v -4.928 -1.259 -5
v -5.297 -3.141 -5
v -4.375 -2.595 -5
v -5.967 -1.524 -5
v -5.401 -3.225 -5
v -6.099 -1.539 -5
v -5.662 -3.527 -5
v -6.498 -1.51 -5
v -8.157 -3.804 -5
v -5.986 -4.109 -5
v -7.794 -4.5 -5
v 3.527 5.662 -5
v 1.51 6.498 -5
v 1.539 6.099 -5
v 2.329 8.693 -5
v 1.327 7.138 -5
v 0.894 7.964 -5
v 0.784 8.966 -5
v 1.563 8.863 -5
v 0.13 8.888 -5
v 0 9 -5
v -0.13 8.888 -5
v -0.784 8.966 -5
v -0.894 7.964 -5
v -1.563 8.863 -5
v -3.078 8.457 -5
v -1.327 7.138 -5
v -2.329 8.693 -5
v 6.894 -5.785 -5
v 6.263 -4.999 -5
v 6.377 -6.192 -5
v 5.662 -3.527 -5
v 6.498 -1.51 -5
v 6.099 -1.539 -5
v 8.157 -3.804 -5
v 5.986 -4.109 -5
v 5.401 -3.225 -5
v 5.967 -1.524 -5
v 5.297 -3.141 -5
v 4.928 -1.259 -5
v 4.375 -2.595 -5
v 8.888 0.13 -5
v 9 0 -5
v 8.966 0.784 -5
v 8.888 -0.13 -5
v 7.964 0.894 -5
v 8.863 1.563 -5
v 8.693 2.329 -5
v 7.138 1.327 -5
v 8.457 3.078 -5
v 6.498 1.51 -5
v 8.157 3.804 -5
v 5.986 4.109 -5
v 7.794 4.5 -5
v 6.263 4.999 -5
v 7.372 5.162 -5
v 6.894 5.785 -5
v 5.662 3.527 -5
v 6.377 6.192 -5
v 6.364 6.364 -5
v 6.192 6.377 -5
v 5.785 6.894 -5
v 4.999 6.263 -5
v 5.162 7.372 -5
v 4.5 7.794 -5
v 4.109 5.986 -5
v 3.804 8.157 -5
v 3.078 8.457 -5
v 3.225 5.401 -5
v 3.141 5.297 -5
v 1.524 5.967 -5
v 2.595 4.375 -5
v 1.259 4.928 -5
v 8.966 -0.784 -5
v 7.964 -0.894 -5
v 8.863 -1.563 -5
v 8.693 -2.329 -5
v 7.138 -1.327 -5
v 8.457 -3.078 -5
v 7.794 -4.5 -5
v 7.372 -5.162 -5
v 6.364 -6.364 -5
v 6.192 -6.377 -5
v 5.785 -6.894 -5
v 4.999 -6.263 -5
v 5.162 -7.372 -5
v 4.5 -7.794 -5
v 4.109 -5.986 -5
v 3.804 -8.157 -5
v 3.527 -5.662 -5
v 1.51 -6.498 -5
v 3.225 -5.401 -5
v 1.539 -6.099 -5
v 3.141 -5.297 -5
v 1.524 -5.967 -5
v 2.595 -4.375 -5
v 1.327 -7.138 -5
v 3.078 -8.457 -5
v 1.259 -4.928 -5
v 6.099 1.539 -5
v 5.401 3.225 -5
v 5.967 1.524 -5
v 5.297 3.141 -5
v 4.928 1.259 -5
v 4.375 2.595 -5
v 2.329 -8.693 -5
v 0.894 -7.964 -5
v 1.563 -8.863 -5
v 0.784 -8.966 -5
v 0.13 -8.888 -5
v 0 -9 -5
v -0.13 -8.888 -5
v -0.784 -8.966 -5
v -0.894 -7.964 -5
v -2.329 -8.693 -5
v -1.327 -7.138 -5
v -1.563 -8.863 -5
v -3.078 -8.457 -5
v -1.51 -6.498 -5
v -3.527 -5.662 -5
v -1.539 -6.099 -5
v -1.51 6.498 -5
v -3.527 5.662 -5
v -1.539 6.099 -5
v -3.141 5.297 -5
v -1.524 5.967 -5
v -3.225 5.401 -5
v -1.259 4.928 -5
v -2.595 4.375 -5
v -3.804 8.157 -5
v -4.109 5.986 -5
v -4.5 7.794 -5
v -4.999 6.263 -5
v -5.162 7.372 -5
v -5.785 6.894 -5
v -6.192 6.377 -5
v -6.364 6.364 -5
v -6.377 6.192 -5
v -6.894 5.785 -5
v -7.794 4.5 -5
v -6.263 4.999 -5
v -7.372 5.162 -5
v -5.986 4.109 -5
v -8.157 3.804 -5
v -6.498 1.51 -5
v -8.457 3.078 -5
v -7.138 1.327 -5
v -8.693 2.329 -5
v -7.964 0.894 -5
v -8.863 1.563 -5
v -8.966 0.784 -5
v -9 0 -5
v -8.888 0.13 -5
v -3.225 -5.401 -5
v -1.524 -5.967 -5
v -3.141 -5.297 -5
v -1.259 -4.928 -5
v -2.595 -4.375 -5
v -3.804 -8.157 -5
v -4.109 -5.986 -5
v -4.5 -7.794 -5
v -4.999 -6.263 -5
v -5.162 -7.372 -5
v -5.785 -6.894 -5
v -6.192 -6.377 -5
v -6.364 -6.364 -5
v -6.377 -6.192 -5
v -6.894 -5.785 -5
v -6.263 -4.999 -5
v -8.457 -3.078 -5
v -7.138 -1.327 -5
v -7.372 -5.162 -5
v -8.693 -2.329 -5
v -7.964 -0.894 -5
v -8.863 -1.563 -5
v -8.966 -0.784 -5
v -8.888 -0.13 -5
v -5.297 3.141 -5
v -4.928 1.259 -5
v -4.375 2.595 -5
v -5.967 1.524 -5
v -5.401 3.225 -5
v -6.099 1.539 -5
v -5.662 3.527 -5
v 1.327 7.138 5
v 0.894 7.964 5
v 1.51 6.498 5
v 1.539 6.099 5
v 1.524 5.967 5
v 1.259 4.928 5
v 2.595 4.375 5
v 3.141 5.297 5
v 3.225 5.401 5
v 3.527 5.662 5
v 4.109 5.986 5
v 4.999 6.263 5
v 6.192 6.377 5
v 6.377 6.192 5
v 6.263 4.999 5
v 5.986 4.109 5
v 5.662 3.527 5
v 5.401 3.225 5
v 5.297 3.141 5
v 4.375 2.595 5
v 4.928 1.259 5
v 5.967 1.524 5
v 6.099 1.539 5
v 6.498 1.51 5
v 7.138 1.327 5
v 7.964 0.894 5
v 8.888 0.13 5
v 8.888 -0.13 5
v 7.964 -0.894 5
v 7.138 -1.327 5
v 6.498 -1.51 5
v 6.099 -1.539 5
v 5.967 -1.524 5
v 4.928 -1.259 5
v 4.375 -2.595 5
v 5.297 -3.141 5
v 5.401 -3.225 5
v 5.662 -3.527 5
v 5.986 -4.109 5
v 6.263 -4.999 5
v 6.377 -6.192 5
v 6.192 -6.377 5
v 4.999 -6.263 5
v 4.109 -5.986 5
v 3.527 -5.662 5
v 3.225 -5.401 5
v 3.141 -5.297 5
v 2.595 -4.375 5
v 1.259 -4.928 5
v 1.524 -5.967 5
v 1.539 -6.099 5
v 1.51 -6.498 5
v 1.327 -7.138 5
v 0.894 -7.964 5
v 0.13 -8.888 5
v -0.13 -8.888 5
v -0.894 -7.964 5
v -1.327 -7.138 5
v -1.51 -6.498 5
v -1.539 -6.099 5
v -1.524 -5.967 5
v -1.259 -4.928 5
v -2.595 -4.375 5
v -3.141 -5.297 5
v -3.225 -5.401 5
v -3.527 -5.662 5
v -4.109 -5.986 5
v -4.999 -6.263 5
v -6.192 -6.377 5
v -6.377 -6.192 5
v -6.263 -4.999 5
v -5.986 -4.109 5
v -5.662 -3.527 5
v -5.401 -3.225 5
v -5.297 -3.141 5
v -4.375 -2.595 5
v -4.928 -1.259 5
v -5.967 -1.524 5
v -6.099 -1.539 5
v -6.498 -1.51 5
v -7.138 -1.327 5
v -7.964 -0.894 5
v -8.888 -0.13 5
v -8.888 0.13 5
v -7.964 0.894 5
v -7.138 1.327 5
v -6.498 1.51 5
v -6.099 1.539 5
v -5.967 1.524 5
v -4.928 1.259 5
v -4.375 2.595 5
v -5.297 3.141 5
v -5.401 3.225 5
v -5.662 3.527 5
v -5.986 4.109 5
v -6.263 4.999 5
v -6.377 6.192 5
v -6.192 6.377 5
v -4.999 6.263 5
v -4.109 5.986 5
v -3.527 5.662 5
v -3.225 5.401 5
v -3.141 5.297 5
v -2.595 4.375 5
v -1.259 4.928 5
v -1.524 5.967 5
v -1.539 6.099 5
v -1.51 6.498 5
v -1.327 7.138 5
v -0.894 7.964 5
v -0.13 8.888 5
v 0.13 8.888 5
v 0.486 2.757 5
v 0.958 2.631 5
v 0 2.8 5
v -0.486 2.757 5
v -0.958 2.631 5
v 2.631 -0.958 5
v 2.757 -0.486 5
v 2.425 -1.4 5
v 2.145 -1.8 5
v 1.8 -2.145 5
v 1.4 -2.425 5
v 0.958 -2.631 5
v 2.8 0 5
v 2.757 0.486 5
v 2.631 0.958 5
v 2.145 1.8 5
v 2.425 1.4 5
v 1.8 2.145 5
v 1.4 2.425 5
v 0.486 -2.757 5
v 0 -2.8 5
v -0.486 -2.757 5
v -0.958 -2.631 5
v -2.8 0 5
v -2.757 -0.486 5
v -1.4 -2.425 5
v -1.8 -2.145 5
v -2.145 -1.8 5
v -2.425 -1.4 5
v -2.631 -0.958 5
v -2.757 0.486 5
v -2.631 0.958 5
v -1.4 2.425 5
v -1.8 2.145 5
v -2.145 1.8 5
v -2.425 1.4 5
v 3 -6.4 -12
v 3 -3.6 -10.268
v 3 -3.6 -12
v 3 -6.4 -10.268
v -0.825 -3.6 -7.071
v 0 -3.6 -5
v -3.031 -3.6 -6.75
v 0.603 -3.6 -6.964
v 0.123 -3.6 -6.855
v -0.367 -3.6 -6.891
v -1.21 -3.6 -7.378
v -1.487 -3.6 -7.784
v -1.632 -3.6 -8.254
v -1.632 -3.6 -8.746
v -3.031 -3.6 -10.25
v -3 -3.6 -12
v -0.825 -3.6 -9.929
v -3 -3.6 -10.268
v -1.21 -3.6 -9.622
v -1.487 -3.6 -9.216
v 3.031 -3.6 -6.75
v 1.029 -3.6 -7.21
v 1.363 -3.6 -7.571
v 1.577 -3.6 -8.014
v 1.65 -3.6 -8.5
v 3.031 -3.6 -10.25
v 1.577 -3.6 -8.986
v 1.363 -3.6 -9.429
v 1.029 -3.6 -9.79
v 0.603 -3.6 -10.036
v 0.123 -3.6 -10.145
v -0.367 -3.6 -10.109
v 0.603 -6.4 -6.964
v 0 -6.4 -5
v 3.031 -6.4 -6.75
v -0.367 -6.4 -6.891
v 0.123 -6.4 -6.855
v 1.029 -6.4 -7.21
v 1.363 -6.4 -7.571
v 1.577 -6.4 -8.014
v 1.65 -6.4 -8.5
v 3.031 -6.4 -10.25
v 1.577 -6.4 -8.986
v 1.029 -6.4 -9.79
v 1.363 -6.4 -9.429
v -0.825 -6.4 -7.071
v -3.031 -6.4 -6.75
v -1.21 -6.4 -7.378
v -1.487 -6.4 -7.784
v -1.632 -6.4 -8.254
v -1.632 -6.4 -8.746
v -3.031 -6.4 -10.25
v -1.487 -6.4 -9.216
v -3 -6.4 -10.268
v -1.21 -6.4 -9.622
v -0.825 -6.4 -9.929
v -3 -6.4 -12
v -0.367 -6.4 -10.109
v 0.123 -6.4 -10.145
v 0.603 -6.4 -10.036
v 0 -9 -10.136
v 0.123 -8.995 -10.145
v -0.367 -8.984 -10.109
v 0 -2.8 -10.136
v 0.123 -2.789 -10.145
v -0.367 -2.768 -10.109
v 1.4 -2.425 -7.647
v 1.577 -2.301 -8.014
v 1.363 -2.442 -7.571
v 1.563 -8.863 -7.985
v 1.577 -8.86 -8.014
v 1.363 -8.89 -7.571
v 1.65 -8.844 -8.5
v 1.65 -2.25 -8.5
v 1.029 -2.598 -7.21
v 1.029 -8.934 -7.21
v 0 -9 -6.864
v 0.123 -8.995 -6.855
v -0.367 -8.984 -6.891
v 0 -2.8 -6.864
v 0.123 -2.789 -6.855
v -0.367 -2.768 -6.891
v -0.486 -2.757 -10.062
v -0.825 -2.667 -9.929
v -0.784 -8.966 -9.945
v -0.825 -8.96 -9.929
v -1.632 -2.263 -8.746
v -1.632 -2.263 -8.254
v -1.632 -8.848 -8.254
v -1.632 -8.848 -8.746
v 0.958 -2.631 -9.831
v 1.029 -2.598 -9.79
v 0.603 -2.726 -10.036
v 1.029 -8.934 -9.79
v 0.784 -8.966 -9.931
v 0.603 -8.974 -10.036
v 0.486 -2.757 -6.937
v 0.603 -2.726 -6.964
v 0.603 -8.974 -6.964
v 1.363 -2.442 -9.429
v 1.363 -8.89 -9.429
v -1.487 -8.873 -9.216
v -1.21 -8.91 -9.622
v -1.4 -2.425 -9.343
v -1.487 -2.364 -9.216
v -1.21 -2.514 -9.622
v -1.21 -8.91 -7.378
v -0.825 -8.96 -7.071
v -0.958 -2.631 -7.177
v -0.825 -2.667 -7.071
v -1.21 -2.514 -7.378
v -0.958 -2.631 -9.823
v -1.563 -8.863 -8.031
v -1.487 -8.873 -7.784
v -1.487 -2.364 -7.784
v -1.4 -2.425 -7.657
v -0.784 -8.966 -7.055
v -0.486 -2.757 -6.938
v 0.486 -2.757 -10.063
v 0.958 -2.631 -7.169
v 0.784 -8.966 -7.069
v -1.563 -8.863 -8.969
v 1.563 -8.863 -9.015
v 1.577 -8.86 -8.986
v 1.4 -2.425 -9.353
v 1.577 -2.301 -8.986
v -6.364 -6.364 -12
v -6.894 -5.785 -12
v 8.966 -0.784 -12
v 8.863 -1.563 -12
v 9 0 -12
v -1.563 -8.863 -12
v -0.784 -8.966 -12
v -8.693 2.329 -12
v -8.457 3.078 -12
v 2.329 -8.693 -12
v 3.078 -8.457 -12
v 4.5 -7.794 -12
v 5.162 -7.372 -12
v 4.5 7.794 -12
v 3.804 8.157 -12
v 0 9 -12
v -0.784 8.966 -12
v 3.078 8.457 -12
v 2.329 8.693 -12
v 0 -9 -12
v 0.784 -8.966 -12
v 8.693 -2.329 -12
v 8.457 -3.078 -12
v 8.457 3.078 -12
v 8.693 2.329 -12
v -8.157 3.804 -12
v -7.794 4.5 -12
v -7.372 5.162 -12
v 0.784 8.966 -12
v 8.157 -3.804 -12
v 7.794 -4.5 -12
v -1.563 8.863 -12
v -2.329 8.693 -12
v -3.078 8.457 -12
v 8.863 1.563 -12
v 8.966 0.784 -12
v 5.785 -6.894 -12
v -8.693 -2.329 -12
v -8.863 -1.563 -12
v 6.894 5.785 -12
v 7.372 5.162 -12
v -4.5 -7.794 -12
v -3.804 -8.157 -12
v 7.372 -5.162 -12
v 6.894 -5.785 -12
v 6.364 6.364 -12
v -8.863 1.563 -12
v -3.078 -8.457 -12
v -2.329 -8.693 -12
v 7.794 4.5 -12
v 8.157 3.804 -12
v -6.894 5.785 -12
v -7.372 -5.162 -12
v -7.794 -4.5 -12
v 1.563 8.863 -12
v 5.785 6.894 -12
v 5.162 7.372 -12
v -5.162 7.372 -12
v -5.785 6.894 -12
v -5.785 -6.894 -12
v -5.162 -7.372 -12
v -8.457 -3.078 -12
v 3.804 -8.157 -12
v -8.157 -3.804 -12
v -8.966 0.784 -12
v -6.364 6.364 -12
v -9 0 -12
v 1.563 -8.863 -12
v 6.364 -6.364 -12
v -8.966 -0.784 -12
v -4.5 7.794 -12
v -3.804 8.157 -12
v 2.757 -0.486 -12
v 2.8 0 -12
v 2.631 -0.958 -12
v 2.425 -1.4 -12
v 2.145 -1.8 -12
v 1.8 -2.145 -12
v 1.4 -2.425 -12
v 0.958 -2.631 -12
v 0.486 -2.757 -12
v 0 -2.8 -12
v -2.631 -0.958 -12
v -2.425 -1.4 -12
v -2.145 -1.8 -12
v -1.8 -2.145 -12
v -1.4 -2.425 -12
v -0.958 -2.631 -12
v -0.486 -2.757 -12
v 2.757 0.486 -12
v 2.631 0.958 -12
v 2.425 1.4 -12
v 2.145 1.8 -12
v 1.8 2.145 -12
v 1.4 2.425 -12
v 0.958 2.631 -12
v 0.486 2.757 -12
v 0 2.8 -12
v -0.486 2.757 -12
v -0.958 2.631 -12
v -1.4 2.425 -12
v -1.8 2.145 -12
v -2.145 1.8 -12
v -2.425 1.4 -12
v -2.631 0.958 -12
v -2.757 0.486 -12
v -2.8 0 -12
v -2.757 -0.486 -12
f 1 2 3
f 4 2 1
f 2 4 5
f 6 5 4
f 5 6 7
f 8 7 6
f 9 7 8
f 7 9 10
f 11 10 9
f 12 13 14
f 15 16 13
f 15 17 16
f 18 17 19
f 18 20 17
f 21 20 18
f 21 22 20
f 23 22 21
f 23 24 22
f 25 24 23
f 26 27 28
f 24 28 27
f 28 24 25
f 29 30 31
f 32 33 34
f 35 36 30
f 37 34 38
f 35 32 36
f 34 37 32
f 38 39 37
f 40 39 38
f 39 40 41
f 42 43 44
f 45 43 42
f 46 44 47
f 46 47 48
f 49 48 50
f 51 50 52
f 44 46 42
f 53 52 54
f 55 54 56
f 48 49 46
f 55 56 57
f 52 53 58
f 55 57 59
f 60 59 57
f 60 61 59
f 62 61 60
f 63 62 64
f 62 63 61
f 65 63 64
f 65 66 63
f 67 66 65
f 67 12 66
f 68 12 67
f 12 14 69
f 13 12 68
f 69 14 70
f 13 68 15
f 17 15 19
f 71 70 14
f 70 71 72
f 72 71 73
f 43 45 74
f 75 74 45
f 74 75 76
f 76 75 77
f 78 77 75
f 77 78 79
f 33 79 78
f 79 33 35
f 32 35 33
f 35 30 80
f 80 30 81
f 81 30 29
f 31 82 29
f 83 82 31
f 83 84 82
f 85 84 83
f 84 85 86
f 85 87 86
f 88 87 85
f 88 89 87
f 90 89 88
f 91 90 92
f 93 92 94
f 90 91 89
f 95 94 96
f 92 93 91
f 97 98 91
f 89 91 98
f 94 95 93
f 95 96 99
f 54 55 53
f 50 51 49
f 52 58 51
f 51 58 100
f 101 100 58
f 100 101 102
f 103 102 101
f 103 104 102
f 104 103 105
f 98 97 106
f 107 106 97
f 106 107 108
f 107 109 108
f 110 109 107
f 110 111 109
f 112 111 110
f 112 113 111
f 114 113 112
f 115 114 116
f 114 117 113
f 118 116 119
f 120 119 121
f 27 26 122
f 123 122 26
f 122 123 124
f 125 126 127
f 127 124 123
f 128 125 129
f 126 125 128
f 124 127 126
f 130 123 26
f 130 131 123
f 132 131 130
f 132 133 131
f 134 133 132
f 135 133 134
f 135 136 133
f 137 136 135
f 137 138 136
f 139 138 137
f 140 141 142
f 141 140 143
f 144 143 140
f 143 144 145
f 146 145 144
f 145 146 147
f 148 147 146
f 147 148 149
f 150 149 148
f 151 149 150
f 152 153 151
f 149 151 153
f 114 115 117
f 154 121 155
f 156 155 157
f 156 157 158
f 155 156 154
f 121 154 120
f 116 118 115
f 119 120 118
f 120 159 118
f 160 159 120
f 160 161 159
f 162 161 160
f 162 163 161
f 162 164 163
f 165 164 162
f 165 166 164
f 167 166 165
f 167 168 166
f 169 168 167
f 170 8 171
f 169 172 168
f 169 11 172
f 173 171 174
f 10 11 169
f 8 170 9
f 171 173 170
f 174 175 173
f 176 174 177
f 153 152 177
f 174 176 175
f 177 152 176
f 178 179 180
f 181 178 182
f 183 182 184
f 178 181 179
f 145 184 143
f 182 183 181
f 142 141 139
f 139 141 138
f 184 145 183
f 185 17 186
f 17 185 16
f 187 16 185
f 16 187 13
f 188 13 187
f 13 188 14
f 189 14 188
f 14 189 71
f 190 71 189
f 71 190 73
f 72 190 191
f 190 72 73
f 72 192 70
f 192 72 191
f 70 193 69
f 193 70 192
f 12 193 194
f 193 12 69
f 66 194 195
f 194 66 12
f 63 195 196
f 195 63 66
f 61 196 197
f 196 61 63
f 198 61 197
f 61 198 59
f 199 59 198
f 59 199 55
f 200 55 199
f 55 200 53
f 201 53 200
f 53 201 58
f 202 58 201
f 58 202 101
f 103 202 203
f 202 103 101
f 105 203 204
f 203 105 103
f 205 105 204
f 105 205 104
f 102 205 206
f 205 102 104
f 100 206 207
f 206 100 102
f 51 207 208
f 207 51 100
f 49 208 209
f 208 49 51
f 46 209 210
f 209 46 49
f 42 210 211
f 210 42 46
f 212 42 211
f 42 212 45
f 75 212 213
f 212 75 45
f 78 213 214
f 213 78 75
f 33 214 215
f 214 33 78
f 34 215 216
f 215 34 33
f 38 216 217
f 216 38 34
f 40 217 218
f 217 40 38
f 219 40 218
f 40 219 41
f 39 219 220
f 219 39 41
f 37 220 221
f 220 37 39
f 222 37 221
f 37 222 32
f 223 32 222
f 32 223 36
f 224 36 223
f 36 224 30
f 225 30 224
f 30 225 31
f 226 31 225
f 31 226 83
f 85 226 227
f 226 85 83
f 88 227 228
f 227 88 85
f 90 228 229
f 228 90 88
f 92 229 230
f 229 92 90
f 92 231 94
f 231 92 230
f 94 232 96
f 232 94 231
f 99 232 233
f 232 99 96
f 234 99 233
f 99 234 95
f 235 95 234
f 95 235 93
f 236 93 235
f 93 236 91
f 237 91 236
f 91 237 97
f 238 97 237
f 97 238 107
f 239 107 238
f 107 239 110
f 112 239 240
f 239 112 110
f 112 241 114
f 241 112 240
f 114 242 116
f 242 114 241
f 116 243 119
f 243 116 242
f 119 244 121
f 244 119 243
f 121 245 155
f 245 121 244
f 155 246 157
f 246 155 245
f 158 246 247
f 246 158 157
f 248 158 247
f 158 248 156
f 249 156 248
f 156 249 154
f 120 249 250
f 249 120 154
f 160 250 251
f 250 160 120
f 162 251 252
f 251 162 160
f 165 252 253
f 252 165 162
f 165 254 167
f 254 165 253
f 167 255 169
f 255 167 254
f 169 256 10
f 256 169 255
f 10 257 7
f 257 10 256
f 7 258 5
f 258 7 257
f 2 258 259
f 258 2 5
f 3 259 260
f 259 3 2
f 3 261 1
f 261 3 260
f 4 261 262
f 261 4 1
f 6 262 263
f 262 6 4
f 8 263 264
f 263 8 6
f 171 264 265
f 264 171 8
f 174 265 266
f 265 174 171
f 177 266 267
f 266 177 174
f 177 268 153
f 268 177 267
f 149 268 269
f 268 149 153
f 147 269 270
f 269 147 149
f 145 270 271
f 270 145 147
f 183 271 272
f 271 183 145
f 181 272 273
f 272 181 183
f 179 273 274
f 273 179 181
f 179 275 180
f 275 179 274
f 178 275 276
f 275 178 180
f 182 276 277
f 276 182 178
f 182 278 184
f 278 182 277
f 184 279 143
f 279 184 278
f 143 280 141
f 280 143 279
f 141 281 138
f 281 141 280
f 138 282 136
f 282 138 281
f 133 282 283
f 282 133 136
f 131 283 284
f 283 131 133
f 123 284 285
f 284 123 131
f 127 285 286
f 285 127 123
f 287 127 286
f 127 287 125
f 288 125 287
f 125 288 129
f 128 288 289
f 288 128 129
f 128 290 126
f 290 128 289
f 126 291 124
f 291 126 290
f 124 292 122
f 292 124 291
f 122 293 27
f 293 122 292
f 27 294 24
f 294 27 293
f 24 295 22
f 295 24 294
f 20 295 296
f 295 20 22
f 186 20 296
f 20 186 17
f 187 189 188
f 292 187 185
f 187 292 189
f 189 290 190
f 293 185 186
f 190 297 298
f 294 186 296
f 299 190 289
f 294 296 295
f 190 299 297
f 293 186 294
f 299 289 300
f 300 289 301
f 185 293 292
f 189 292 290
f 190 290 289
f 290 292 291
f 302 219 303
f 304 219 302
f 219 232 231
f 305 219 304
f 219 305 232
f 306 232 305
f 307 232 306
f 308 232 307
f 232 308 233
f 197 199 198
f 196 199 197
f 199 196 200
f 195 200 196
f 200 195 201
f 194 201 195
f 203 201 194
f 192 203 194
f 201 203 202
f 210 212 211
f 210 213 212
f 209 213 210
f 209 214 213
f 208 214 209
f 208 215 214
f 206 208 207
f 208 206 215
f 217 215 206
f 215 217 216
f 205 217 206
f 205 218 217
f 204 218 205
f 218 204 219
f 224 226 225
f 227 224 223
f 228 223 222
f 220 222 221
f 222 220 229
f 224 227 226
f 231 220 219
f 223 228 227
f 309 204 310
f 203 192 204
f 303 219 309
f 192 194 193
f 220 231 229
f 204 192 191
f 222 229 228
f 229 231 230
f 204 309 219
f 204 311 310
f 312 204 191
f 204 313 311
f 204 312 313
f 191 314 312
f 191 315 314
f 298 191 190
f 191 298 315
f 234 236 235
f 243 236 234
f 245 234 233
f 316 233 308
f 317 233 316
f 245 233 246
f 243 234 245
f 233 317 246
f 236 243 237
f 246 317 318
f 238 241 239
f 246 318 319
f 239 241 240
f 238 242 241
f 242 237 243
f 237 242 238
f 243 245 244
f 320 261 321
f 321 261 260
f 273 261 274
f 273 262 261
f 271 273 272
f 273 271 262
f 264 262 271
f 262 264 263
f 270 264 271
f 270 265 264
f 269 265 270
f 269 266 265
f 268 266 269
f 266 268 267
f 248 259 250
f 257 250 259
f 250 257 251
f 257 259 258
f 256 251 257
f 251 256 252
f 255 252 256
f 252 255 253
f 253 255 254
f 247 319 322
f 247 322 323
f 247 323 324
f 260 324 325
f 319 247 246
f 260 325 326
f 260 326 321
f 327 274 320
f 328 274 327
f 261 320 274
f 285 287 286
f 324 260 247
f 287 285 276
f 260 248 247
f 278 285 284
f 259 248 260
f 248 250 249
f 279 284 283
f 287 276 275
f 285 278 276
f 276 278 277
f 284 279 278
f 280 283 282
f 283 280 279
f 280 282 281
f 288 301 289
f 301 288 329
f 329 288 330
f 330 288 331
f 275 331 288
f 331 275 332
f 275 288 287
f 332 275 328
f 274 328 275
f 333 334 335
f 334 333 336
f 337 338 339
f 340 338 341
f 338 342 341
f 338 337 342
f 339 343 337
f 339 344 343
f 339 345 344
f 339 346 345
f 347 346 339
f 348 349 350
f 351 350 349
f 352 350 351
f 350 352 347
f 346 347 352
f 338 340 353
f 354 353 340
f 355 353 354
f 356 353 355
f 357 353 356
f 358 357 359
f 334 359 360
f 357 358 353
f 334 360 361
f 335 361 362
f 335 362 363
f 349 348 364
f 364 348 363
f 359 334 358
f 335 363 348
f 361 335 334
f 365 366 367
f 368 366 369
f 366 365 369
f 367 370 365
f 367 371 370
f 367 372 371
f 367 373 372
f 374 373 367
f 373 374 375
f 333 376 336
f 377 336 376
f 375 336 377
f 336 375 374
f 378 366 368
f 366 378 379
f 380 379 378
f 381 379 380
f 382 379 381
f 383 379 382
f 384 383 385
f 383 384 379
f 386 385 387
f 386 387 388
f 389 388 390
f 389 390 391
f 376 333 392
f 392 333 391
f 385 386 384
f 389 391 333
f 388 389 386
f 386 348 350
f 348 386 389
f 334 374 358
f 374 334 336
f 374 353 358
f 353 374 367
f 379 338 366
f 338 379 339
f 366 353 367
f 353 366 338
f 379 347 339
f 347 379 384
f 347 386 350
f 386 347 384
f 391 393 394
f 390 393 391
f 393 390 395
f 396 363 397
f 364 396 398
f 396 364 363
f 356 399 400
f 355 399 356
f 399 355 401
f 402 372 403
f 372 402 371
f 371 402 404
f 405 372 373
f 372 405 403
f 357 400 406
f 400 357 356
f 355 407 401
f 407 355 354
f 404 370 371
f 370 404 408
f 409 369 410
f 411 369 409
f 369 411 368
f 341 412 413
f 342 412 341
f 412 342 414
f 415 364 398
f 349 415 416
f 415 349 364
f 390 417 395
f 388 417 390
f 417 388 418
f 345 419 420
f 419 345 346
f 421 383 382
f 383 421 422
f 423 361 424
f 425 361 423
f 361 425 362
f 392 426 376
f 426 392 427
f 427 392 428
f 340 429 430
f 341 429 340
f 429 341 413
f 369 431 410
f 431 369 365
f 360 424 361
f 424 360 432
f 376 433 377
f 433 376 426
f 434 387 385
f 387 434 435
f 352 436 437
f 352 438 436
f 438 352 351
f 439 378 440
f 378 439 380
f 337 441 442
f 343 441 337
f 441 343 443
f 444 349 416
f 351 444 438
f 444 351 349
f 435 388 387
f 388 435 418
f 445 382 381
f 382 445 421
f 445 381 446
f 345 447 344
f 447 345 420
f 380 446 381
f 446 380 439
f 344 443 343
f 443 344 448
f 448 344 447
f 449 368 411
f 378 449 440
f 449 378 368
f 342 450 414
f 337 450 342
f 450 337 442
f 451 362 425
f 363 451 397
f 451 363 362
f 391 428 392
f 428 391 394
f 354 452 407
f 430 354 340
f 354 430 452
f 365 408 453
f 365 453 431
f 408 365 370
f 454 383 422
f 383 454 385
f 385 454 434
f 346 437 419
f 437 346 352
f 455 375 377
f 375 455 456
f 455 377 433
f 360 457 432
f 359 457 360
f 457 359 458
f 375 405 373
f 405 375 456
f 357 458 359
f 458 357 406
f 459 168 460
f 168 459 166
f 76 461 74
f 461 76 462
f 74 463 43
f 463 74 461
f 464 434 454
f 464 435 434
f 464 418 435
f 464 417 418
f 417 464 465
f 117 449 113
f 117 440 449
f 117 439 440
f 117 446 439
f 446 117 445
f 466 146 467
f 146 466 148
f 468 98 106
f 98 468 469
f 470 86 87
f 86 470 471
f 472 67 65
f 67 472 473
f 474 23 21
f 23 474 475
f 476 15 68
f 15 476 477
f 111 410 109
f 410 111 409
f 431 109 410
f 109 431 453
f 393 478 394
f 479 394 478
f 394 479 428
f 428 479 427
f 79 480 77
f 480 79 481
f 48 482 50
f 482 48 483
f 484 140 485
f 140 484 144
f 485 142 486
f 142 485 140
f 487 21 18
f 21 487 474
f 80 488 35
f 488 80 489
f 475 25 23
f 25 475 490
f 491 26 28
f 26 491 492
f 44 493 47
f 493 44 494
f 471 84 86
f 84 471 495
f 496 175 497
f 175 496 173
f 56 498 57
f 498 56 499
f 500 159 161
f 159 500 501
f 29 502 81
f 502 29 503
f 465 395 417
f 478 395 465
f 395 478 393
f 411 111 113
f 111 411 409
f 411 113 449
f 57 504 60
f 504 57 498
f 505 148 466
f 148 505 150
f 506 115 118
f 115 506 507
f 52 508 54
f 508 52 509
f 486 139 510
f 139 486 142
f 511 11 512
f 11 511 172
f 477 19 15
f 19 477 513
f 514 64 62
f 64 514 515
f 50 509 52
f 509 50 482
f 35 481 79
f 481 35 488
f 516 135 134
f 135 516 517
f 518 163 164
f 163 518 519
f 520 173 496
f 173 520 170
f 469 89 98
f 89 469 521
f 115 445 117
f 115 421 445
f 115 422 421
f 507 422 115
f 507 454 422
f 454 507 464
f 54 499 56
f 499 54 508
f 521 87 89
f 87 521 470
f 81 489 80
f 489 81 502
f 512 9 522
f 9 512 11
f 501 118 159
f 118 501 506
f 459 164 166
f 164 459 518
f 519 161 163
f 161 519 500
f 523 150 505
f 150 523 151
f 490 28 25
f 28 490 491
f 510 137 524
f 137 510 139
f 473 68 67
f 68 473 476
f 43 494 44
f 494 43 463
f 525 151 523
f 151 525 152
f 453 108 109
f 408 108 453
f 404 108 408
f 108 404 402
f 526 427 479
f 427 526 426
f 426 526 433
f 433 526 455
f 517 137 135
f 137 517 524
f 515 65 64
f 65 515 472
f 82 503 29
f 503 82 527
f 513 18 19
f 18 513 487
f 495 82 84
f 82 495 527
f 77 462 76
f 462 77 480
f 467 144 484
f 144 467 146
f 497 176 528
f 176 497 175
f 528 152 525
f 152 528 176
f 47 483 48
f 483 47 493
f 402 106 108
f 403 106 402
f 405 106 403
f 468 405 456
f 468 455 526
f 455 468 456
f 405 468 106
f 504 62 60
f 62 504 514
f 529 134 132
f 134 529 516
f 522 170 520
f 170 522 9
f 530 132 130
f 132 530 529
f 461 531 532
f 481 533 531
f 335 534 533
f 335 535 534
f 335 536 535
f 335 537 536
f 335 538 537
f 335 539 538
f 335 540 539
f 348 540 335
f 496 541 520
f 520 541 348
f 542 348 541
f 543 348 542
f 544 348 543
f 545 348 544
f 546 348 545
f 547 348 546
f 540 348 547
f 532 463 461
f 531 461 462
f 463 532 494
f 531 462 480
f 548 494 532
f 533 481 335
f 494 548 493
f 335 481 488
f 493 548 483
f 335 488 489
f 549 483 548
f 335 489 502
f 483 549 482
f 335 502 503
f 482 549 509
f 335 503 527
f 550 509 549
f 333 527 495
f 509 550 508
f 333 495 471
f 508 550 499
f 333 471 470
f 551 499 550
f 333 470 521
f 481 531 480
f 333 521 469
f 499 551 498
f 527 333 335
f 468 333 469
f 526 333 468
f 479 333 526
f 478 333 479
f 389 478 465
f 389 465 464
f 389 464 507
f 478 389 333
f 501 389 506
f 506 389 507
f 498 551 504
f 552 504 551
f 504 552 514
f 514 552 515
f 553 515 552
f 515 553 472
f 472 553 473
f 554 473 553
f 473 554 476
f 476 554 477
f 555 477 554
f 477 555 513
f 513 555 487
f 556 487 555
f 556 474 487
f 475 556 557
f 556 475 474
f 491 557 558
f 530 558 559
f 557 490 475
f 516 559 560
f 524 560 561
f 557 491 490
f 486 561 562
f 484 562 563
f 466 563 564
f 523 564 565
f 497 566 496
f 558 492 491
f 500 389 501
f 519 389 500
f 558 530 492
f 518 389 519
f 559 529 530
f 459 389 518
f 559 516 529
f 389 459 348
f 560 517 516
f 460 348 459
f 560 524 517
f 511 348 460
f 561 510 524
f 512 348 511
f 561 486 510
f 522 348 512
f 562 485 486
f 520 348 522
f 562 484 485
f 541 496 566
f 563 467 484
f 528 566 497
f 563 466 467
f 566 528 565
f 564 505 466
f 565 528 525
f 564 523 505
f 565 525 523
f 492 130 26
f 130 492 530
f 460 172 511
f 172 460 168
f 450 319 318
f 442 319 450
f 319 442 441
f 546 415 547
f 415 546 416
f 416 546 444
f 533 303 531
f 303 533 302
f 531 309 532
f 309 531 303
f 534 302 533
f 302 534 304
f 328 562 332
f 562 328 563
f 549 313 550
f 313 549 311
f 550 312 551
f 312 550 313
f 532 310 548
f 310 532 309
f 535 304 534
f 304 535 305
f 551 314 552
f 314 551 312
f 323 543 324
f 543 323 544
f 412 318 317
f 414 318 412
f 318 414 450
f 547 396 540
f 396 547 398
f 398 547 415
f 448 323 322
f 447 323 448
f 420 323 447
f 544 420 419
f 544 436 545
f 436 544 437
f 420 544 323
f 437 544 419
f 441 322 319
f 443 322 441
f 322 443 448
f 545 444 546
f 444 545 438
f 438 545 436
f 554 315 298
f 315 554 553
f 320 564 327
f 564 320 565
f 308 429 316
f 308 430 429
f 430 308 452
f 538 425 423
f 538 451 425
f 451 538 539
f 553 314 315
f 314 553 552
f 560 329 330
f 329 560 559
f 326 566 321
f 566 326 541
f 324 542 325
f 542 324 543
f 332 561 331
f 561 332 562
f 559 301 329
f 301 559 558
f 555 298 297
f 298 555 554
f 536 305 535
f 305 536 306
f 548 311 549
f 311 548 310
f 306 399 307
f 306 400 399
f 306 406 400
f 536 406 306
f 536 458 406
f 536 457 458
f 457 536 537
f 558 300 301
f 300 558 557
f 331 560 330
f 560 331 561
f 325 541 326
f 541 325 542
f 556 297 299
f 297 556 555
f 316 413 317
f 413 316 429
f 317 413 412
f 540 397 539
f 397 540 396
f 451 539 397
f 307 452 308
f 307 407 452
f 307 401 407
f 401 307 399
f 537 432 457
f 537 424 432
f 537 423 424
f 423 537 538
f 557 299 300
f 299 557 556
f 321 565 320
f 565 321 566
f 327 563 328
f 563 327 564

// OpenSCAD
/* Derived by Carlosgs from:
 * http://www.thingiverse.com/thing:12789
 * An extruder gear set for the TechZone Huxley,
 *	featuring Herringbone teeth.
 * You will have to recalibrate your E_STEPS_PER_MM in
 *	your firmware (ratio changing from original techzone
 *	lasercut gears).
 * This use 2 modules from the MCAD library that you can
 *	get from https://github.com/elmom/MCAD.
 * 
 * Part - the motor gear mount hub with set screw hole -
 *	derived from http://www.thingiverse.com/thing:3104
 *	(thanks GilesBathgate) which is under GPL CC license.
 *
 * August 2013 added 2 extra setscrews to ensure centered usage.
 * by Harry Binnema. 
 *
* Copyright (C) 2011	Guy 'DeuxVis' P.
 *
 * This program is free software; you can redistribute it and/or
 * modify it under the terms of the GNU General Public License
 * as published by the Free Software Foundation; either version 2
 * of the License, or (at your option) any later version.
 * 
 * This program is distributed in the hope that it will be useful,
 * but WITHOUT ANY WARRANTY; without even the implied warranty of
 * MERCHANTABILITY or FITNESS FOR A PARTICULAR PURPOSE.	See the
 * GNU General Public License for more details.

 * You should have received a copy of the GNU General Public License
 * along with this program; if not, write to the Free Software
 * Foundation, Inc., 51 Franklin Street, Fifth Floor, Boston, MA	02110-1301, USA.
 * -- 
 *		 DeuxVis - device@ymail.com */

include <MCAD/materials.scad>
include <MCAD/teardrop.scad>
include <MCAD/involute_gears.scad>

motor_shaft_diameter=5.6;
pos=15.4-1; //position hole for grubnut
nholes = 7;
shaft_diam=9;
shaft_height=7;

// Increase the resolution of default shapes
$fa = 5; // Minimum angle for fragments [degrees]
$fs = 0.5; // Minimum fragment size [mm]

/* Herringbone gear module, adapted from MCAD/involute_gears */
module herringbone_gear( teeth=12, circles=0, shaft=5 ) {
	twist=0;//100;
	height=10;
	pressure_angle=30;

	module myGear() {
		gear(
			number_of_teeth=teeth,
			circular_pitch=320,
			pressure_angle=pressure_angle,
			clearance = 0.2,
			gear_thickness = height/2,
			rim_thickness = height/2,
			rim_width = 1,
			hub_thickness = height/2,
			hub_diameter=1,
			bore_diameter=shaft,
			circles=circles,
			twist=twist/teeth
		);
	}
	
	myGear();
	mirror( [0,0,1] )
		myGear();
}

module cyclone_motor_z_gear(with_extra_parts=false, exploded=false) {
// Motor gear
rotate([180,0,0]) union() difference() {	 
	union() {

		//gear
		herringbone_gear( teeth=8 );

		translate( [0, 0, 12] ) mirror( [0, 0, 1] ) difference() {
			//shaft
			cylinder( r=shaft_diam, h=shaft_height);
			//captive nut and grub holes
			translate( [0, 19.5, 3.5] ) rotate( [90, 0, 0] ) union() {
				//enterance
				translate( [0, -3, 14.5] ) cube( [6, 6, 2.8], center=true );
				//nut
				translate( [0, 0, 14.5] ) rotate( [0, 0, 30] )
					cylinder( r=6/2+0.5, h=2.8, $fn=6, center=true);
				//grub hole
				translate( [0, 0, 9] ) cylinder( r=3.3/2, h=10);
			}
		}
	}

	//shaft hole
	translate( [0, 0, -6] ) cylinder( r=motor_shaft_diameter/2, h=20);
}
}

cyclone_motor_z_gear();
